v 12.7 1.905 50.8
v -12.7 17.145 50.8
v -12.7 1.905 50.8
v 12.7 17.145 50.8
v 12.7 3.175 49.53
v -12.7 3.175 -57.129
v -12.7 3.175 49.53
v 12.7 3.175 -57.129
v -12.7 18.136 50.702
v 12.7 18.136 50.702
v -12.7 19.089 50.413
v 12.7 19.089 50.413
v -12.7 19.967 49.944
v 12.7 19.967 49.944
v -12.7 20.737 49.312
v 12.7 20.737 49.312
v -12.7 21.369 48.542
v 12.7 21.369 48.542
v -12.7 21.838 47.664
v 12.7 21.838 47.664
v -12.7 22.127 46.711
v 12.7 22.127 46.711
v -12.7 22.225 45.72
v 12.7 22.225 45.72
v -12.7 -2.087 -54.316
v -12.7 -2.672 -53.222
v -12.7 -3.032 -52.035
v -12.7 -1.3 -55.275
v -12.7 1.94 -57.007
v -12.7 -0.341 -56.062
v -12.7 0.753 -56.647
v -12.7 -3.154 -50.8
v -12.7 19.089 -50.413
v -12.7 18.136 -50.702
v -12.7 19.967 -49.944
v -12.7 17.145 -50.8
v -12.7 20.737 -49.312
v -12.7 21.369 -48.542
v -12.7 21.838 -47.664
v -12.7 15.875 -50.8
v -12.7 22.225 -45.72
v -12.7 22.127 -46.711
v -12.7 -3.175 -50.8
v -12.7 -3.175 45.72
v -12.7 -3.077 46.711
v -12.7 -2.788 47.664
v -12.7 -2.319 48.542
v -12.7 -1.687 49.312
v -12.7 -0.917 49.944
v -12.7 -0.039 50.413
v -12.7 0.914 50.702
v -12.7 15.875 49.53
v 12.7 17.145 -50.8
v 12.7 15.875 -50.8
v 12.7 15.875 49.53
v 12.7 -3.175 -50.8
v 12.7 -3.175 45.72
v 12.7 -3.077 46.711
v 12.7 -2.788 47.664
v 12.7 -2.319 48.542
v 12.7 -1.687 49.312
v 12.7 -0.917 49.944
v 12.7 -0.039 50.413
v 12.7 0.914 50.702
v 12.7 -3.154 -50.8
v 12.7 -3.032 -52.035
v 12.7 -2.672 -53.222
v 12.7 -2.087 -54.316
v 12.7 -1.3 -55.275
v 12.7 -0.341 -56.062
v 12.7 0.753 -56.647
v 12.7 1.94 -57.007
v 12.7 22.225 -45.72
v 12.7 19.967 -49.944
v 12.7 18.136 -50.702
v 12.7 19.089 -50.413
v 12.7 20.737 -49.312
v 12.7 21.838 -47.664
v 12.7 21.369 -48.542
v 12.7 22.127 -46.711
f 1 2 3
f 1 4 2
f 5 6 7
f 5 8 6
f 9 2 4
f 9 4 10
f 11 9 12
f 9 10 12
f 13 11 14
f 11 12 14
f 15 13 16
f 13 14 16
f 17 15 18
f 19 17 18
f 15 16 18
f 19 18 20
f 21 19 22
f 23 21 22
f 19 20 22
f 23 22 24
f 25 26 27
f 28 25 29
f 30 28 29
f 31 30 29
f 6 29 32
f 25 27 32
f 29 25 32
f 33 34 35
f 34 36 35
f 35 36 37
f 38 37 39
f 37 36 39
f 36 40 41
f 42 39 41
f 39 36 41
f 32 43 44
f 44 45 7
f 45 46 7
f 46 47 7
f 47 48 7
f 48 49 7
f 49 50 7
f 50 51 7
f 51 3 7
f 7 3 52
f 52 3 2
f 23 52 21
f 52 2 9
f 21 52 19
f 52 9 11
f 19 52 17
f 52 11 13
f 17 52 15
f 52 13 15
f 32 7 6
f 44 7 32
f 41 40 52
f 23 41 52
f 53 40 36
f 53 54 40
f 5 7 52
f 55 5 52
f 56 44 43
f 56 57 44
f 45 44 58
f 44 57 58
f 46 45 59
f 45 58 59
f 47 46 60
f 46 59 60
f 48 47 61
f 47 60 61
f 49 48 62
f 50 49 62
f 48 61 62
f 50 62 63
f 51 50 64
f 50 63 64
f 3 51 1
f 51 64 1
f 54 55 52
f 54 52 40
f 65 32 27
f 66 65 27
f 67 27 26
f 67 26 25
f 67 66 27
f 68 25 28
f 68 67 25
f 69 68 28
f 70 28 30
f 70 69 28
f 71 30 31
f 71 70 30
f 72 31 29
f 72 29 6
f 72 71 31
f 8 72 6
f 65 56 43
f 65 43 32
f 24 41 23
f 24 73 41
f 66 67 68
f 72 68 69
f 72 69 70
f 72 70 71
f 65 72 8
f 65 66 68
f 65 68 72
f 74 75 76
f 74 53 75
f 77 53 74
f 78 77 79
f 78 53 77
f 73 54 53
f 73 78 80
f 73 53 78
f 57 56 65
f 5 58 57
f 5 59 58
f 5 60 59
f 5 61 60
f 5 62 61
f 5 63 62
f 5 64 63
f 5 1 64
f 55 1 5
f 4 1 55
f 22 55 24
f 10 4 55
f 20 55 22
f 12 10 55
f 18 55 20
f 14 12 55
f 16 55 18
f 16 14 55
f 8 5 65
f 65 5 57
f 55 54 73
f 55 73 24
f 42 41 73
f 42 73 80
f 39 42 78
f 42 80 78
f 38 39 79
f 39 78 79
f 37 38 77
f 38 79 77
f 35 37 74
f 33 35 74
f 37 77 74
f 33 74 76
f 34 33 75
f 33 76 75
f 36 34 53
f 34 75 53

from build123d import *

# Parameters (mm, degrees)
F0_W     = 12.7
F0_H     = 1.27
F1_DEPTH = 12.7
F2_R     = 5.08


with BuildPart() as f1:
    # F0 (on Right) → F1 (new body, symmetric)
    with BuildSketch(Plane.YZ):
        with Locations((9.525, 50.165)):
            Rectangle(F0_W, F0_H)
        Polygon((3.175, -50.8), (3.175, 49.53), (3.175, 50.8), (-3.175, 50.8), (-3.175, -50.8), (-3.153914, -50.8), align=None)
        Polygon((15.875, -50.8), (22.225, -50.8), (22.225, 50.8), (15.875, 50.8), (15.875, 49.53), align=None)
        with BuildLine():
            Line((3.175, -57.128914), (3.175, -50.8))
            Line((3.175, -50.8), (-3.153914, -50.8))
            ThreePointArc((-3.153914, -50.8), (-1.300218, -55.275218), (3.175, -57.128914))
        make_face()
    extrude(amount=F1_DEPTH, both=True)

    # F2
    f2_edges = [f1.edges().sort_by_distance(p)[0] for p in [
        (0, 22.225, 50.8),
        (0, -3.175, 50.8),
        (0, 22.225, -50.8),
    ]]
    fillet(f2_edges, radius=F2_R)


solid = f1.part
